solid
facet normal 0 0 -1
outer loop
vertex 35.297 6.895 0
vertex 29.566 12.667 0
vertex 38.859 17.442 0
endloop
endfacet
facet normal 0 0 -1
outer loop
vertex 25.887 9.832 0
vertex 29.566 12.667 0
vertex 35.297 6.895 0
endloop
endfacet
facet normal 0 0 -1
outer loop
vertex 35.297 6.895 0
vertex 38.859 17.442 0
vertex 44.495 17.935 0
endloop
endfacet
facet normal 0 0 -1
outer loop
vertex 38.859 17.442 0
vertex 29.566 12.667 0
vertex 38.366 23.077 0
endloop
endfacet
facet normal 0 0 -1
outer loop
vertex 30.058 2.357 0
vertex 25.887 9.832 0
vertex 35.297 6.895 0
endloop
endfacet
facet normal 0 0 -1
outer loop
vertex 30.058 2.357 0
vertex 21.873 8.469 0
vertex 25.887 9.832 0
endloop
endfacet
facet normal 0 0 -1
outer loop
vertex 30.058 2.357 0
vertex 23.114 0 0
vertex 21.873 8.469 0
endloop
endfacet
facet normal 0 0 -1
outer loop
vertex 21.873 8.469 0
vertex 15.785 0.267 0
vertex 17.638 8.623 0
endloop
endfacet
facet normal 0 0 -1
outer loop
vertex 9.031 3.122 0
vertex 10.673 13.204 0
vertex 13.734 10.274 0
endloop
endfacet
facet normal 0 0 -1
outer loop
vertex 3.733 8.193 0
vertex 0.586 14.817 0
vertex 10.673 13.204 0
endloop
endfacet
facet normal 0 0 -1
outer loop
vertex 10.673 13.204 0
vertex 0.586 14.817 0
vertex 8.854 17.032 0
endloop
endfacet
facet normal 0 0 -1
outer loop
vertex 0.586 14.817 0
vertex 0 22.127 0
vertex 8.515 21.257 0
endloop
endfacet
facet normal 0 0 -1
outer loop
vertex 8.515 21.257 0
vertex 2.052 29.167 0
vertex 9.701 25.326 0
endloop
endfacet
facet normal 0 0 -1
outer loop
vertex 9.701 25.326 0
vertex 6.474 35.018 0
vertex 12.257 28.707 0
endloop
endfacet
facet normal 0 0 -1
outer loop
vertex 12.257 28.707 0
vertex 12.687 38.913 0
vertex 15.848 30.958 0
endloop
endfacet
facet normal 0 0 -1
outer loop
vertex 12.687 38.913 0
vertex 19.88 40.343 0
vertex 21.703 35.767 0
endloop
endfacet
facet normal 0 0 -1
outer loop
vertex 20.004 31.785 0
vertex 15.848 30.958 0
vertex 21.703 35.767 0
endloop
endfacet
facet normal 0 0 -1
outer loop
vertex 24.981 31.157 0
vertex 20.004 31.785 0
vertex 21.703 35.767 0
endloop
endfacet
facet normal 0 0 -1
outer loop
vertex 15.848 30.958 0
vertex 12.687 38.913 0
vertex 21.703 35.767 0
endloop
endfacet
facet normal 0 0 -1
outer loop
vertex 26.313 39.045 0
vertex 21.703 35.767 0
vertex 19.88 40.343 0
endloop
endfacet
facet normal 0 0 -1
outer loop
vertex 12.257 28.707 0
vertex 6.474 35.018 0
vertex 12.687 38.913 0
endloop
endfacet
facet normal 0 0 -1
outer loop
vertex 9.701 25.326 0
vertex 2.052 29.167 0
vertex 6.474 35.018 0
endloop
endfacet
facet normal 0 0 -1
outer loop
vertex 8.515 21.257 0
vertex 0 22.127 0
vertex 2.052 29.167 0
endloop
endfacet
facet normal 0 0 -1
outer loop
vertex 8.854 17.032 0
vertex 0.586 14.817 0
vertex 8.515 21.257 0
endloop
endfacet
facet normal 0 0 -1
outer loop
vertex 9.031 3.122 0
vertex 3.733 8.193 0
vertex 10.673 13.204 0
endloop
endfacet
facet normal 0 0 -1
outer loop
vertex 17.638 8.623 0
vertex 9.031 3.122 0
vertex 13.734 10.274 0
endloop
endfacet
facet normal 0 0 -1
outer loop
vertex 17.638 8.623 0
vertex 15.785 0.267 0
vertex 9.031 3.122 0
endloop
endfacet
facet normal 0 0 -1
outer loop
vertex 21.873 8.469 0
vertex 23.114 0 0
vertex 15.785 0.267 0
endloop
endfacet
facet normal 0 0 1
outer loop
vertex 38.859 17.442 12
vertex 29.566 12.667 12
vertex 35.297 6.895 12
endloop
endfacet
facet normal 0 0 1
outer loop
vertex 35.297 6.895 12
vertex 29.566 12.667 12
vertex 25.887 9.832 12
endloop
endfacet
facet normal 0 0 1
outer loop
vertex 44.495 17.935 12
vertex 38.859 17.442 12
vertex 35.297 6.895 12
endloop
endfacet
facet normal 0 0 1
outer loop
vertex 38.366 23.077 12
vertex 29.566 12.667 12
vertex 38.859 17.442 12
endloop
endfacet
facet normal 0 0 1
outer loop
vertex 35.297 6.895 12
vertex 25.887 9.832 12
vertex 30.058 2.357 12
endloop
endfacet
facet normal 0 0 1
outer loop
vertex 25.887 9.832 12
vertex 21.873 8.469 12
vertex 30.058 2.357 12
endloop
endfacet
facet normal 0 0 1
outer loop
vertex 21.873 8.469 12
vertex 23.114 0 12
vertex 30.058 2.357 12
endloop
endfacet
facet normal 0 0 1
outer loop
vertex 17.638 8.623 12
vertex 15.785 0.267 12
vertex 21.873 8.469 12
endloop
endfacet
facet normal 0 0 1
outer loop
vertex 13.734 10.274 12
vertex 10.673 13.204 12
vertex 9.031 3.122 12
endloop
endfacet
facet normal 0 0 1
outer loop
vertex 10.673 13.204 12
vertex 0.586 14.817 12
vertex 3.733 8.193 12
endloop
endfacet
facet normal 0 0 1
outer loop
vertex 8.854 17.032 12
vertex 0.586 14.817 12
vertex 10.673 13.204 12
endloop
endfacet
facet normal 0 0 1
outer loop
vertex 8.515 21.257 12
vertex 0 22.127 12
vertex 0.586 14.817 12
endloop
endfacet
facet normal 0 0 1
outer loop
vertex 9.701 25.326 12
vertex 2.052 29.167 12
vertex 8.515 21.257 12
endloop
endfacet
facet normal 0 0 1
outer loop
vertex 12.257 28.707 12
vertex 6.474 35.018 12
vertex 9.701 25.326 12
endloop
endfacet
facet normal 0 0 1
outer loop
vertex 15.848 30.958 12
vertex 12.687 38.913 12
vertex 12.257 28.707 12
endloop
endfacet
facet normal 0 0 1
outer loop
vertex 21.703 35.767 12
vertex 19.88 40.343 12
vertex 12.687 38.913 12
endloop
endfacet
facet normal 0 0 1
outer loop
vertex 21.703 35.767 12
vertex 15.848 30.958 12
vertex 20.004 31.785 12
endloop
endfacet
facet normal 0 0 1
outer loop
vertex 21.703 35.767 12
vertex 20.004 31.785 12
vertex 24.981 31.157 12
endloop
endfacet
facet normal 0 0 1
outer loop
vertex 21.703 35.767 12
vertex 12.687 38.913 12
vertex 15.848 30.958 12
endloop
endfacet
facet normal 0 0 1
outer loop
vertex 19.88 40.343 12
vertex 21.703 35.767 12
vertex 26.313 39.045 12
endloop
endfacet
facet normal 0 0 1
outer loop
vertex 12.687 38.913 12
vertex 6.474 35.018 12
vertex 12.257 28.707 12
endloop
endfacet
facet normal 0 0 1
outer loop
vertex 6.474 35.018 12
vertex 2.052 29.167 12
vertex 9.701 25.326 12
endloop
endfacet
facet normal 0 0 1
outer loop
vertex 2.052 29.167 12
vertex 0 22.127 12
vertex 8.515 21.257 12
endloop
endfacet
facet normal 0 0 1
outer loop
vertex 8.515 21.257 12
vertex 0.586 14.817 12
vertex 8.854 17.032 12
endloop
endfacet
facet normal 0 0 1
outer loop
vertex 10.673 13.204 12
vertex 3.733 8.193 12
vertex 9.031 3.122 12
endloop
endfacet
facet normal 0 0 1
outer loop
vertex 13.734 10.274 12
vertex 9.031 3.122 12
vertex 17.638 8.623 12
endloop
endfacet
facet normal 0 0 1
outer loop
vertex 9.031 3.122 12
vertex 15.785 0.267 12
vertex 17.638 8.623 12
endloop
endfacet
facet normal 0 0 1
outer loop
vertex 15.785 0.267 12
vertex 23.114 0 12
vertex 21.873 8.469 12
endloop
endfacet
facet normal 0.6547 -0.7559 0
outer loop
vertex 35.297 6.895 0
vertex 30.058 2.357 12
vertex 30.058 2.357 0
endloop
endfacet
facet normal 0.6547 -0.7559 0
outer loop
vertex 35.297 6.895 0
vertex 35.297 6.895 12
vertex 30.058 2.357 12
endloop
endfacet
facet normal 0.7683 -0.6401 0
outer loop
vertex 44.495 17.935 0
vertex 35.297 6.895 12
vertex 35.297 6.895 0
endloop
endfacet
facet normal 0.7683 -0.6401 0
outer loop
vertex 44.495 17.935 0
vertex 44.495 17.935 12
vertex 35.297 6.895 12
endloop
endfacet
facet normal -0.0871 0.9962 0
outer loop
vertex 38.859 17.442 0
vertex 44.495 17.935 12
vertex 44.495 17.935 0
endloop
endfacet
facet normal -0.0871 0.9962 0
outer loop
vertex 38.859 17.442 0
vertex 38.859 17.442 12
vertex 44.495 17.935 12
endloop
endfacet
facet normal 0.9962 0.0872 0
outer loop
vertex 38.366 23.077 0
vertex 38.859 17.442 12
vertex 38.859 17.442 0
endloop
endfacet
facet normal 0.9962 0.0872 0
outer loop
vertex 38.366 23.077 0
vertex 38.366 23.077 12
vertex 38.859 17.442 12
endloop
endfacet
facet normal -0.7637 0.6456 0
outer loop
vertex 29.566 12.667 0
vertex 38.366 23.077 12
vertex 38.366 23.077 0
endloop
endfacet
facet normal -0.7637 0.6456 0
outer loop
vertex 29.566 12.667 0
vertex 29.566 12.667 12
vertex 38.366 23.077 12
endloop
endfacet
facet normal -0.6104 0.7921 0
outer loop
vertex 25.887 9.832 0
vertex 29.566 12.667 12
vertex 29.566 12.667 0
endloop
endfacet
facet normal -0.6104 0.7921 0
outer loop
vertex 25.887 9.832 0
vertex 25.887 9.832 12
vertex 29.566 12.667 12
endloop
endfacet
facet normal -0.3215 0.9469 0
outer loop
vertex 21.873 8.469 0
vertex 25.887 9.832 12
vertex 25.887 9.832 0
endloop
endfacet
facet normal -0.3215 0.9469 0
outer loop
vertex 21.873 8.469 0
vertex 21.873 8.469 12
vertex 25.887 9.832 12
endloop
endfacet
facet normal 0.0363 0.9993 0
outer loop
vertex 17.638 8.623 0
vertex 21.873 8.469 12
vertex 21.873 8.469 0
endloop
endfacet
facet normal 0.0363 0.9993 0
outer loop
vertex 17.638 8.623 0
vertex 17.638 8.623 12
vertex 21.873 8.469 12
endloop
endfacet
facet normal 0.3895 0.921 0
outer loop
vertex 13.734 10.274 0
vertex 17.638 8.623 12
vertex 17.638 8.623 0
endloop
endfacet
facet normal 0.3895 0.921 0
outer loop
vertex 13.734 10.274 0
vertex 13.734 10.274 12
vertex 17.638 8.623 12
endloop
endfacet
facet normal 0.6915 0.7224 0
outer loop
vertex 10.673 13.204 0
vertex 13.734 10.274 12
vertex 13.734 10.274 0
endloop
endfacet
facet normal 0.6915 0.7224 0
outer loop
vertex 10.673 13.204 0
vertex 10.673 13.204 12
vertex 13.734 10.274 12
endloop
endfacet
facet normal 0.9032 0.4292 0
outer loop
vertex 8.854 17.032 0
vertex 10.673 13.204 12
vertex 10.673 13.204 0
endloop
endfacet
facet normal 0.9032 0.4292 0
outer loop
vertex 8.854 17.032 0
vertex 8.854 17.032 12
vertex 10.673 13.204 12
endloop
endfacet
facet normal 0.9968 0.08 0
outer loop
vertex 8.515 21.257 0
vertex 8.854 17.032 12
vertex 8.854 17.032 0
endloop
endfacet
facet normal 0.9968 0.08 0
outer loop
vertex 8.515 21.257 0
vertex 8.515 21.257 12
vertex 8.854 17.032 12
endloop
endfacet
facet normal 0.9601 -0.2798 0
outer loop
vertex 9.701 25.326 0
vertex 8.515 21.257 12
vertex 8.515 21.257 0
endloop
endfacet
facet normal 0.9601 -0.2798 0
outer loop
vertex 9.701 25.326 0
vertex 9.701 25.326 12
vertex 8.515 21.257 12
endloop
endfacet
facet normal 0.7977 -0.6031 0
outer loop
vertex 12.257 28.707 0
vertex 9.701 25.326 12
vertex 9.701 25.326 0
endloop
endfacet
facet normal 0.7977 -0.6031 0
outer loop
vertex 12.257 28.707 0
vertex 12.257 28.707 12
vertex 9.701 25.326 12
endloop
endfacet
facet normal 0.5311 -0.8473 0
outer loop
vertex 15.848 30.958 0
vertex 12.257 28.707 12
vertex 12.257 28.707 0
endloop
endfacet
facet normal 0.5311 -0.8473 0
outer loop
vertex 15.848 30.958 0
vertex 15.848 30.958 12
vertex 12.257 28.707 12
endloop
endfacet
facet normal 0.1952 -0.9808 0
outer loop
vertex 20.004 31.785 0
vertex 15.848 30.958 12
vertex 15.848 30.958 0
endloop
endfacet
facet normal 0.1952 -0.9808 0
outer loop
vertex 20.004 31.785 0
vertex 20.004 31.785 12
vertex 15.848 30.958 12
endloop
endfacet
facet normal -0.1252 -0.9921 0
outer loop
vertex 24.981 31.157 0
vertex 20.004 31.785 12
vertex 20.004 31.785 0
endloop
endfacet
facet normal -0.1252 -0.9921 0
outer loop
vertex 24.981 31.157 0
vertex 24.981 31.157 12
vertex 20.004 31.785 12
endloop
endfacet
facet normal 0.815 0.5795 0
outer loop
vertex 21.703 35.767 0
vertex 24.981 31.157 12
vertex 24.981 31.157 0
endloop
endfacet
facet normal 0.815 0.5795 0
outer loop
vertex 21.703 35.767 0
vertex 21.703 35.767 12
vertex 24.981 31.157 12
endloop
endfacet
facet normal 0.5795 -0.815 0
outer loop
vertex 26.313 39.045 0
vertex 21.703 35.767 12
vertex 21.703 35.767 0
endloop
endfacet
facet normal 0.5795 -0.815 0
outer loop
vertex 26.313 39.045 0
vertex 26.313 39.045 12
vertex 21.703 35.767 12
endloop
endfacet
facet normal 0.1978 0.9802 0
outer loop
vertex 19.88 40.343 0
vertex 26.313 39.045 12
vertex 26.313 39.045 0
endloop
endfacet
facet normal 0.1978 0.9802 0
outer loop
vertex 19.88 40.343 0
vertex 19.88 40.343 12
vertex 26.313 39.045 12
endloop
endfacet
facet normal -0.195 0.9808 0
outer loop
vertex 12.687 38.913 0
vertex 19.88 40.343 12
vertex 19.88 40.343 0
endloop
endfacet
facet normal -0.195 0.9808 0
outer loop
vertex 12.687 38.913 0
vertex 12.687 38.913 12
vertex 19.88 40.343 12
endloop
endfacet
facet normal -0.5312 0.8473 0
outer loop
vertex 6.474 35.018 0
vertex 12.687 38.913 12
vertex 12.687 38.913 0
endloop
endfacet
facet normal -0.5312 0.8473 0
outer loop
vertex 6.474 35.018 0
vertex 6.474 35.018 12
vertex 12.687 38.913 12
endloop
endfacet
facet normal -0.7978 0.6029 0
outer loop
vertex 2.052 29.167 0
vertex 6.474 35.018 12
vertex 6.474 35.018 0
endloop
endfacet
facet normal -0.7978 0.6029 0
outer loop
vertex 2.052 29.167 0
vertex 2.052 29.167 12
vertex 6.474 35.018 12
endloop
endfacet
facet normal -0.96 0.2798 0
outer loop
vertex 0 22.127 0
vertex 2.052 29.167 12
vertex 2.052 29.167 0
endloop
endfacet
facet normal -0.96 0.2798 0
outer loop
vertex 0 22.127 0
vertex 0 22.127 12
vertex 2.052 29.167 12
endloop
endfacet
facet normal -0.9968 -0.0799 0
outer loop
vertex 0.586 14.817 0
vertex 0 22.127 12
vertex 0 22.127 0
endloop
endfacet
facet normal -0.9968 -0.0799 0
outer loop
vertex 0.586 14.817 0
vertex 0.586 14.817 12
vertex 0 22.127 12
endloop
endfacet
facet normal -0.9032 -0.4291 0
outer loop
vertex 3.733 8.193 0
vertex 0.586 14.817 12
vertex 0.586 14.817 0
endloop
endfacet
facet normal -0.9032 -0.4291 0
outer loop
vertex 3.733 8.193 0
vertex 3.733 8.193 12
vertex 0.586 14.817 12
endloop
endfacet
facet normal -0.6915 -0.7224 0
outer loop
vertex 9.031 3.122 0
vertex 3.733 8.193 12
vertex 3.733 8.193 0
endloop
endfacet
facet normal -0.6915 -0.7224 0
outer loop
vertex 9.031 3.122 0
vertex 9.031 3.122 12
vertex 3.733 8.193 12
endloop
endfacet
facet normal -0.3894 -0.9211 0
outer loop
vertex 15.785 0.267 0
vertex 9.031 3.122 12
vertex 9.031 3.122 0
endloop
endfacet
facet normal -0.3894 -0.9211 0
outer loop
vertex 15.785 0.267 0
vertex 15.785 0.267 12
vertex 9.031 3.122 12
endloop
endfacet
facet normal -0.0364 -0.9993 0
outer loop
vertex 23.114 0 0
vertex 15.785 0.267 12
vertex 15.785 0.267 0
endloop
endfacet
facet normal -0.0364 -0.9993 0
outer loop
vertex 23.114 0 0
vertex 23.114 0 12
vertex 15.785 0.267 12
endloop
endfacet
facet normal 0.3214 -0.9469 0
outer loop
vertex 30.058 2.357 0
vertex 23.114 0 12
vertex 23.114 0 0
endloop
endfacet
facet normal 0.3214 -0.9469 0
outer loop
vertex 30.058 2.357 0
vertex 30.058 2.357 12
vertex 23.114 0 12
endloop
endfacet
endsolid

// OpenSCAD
$fn = 32;

// ----------------------------------------------------------------------
// Eye lug: ring_tail, 12 mm thick
// ----------------------------------------------------------------------

// --- parameters (mm) ---
profile_height = 12;      // extrusion height
profile_points = 30;      // points of the closed outline

profile = [[21.703, 35.767], [26.313, 39.045], [19.88, 40.343], [12.687, 38.913], [6.474, 35.018], [2.052, 29.167], [0, 22.127], [0.586, 14.817], [3.733, 8.193], [9.031, 3.122], [15.785, 0.267], [23.114, 0], [30.058, 2.357], [35.297, 6.895], [44.495, 17.935], [38.859, 17.442], [38.366, 23.077], [29.566, 12.667], [25.887, 9.832], [21.873, 8.469], [17.638, 8.623], [13.734, 10.274], [10.673, 13.204], [8.854, 17.032], [8.515, 21.257], [9.701, 25.326], [12.257, 28.707], [15.848, 30.958], [20.004, 31.785], [24.981, 31.157]];  // single closed polygon, 30 points, counter clockwise

// --- the one profile operation ---
linear_extrude(height = profile_height) polygon(points = profile);
